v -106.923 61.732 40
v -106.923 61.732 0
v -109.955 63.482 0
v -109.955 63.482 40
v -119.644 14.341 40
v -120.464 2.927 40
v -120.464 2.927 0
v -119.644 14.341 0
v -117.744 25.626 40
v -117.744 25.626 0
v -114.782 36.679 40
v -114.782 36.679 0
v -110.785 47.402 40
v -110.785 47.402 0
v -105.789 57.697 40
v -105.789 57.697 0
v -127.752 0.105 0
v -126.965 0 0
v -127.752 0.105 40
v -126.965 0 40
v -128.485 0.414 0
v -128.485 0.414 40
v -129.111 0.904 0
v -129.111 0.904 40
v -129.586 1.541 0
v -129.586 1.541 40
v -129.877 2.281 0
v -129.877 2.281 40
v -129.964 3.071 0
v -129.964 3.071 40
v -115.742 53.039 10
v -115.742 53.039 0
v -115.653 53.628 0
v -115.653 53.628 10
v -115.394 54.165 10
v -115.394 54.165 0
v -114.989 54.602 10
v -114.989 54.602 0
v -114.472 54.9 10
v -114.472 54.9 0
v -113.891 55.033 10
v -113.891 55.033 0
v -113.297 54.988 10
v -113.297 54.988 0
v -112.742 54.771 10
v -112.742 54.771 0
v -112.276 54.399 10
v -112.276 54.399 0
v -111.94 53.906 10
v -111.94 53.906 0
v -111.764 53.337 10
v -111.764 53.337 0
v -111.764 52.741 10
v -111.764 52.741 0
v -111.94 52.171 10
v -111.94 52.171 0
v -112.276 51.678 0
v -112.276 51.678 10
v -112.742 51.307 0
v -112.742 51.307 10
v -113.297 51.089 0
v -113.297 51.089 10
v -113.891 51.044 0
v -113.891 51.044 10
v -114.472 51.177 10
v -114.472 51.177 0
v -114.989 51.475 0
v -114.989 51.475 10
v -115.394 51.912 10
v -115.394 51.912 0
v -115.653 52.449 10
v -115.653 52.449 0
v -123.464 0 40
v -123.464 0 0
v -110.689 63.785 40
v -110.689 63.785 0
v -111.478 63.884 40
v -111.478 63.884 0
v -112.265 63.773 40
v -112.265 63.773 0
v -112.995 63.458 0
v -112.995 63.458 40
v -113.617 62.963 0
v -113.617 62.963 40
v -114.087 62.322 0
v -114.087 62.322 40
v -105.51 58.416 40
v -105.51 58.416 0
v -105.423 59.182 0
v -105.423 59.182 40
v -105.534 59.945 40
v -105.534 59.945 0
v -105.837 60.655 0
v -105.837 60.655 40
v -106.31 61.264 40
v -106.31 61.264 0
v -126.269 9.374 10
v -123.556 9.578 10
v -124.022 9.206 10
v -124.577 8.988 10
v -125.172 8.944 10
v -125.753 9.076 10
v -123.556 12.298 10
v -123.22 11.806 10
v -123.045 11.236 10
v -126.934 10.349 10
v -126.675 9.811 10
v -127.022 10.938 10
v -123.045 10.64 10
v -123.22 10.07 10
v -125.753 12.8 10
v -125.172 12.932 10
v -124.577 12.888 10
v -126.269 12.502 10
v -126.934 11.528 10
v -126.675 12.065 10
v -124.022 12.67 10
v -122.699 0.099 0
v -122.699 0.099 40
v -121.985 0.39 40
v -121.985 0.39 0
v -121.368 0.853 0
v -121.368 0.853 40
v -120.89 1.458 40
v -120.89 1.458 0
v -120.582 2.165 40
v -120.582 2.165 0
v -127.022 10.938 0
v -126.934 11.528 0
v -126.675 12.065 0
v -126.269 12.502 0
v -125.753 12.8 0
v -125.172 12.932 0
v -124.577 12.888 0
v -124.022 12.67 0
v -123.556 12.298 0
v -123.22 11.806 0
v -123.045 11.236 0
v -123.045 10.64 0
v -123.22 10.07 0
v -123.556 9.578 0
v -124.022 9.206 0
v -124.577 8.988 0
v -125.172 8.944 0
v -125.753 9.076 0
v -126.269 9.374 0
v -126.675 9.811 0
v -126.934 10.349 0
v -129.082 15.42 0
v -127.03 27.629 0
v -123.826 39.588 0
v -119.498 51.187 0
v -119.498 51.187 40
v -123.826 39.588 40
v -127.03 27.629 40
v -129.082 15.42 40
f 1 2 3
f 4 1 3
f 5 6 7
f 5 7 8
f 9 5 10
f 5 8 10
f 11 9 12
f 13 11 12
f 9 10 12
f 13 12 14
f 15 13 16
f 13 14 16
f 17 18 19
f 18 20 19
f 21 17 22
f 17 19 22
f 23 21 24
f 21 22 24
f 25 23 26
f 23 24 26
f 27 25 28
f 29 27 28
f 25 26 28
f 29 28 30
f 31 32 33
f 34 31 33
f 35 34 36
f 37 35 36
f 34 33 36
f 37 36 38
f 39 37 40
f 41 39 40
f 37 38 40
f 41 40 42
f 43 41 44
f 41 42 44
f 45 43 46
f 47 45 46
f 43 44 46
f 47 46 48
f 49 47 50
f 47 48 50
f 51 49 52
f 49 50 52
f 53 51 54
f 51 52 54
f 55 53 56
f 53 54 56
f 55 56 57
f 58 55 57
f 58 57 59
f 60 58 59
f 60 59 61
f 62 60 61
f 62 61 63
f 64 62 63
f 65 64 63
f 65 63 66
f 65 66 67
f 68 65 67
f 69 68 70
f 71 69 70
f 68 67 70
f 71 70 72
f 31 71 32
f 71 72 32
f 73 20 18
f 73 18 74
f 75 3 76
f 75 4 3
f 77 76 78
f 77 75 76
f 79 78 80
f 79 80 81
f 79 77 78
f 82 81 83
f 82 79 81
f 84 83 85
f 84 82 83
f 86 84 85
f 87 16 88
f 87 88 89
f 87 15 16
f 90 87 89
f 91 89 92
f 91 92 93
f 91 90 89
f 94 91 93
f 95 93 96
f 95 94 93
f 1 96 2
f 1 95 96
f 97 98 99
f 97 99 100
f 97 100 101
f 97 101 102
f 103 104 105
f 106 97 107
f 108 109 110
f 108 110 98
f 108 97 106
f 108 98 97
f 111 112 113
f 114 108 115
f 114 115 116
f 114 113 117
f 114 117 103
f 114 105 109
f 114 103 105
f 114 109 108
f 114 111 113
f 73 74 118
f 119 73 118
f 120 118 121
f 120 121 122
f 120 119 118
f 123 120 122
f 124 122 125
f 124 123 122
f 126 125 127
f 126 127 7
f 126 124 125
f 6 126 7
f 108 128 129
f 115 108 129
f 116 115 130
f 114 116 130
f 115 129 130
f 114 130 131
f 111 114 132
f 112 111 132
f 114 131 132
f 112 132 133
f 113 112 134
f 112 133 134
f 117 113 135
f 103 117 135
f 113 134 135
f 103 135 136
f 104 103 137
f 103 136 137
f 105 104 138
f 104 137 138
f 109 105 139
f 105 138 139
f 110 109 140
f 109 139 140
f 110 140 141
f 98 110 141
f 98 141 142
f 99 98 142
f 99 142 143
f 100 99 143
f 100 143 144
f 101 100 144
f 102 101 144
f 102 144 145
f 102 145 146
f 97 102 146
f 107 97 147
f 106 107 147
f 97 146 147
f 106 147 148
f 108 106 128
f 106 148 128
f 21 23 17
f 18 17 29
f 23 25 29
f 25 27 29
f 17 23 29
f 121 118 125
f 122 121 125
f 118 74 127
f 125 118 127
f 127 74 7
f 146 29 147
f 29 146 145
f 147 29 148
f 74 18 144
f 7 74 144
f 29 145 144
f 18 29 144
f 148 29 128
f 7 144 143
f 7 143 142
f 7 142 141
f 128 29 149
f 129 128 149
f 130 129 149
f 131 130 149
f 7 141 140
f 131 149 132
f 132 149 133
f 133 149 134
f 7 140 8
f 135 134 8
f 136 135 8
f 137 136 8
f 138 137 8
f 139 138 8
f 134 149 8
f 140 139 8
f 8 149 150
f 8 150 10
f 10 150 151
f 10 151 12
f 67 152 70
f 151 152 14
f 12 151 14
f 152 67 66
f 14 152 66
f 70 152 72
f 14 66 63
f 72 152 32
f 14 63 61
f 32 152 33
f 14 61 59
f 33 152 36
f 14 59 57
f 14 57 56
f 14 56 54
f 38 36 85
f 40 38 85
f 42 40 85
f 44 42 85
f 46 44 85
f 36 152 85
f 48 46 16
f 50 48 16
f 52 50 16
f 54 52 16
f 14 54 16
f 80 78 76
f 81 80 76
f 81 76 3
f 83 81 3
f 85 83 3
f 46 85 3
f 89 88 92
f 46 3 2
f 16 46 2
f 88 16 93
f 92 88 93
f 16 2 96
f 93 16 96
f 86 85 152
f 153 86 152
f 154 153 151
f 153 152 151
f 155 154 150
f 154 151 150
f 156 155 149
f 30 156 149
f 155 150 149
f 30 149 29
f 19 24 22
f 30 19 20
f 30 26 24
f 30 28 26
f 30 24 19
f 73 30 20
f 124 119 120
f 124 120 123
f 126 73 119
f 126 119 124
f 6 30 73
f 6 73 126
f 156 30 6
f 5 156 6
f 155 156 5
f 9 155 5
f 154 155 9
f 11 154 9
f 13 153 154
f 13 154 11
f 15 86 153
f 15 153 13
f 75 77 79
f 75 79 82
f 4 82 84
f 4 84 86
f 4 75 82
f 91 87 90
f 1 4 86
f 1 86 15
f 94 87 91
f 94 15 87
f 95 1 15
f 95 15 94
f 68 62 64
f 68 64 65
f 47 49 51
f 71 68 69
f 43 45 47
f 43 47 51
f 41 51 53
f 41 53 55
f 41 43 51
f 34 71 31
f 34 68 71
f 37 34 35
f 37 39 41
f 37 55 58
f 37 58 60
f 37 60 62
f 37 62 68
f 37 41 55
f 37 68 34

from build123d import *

# Parameters (mm, degrees)
EXTRUDE_1_DEPTH     = 40
FILLET_1_R          = 3
SKETCH_2_R          = 2
CUT_EXTRUDE_1_DEPTH = 10


with BuildPart() as part:
    # 草图1 → 凸台-拉伸1 (new body)
    with BuildSketch(Plane.XY):
        with BuildLine():
            Line((-130, 0), (-120.5, 0))
            ThreePointArc((-120.5, 0), (-116.394062068, 31.187694935), (-104.356061156, 60.25))
            Line((-104.356061156, 60.25), (-112.583302492, 65))
            ThreePointArc((-112.583302492, 65), (-125.570357418, 33.646475863), (-130, 0))
        make_face()
    extrude(amount=EXTRUDE_1_DEPTH)

    # 圆角1
    fillet_1_edges = [part.edges().sort_by_distance(p)[0] for p in [
        (-104.356061156, 60.25, 20),
        (-120.5, 0, 20),
        (-130, 0, 20),
        (-112.583302492, 65, 20),
    ]]
    fillet(fillet_1_edges, radius=FILLET_1_R)

    # 草图2 → 切除-拉伸1 (cut)
    with BuildSketch(Plane(origin=(0, 0, 0), x_dir=(-1, 0, 0), z_dir=(0, 0, -1))):
        with Locations((125.022434611, 10.938045715)):
            Circle(SKETCH_2_R)
        with Locations((113.741627273, 53.038591848)):
            Circle(SKETCH_2_R)
    extrude(amount=-CUT_EXTRUDE_1_DEPTH, mode=Mode.SUBTRACT)


solid = part.part
